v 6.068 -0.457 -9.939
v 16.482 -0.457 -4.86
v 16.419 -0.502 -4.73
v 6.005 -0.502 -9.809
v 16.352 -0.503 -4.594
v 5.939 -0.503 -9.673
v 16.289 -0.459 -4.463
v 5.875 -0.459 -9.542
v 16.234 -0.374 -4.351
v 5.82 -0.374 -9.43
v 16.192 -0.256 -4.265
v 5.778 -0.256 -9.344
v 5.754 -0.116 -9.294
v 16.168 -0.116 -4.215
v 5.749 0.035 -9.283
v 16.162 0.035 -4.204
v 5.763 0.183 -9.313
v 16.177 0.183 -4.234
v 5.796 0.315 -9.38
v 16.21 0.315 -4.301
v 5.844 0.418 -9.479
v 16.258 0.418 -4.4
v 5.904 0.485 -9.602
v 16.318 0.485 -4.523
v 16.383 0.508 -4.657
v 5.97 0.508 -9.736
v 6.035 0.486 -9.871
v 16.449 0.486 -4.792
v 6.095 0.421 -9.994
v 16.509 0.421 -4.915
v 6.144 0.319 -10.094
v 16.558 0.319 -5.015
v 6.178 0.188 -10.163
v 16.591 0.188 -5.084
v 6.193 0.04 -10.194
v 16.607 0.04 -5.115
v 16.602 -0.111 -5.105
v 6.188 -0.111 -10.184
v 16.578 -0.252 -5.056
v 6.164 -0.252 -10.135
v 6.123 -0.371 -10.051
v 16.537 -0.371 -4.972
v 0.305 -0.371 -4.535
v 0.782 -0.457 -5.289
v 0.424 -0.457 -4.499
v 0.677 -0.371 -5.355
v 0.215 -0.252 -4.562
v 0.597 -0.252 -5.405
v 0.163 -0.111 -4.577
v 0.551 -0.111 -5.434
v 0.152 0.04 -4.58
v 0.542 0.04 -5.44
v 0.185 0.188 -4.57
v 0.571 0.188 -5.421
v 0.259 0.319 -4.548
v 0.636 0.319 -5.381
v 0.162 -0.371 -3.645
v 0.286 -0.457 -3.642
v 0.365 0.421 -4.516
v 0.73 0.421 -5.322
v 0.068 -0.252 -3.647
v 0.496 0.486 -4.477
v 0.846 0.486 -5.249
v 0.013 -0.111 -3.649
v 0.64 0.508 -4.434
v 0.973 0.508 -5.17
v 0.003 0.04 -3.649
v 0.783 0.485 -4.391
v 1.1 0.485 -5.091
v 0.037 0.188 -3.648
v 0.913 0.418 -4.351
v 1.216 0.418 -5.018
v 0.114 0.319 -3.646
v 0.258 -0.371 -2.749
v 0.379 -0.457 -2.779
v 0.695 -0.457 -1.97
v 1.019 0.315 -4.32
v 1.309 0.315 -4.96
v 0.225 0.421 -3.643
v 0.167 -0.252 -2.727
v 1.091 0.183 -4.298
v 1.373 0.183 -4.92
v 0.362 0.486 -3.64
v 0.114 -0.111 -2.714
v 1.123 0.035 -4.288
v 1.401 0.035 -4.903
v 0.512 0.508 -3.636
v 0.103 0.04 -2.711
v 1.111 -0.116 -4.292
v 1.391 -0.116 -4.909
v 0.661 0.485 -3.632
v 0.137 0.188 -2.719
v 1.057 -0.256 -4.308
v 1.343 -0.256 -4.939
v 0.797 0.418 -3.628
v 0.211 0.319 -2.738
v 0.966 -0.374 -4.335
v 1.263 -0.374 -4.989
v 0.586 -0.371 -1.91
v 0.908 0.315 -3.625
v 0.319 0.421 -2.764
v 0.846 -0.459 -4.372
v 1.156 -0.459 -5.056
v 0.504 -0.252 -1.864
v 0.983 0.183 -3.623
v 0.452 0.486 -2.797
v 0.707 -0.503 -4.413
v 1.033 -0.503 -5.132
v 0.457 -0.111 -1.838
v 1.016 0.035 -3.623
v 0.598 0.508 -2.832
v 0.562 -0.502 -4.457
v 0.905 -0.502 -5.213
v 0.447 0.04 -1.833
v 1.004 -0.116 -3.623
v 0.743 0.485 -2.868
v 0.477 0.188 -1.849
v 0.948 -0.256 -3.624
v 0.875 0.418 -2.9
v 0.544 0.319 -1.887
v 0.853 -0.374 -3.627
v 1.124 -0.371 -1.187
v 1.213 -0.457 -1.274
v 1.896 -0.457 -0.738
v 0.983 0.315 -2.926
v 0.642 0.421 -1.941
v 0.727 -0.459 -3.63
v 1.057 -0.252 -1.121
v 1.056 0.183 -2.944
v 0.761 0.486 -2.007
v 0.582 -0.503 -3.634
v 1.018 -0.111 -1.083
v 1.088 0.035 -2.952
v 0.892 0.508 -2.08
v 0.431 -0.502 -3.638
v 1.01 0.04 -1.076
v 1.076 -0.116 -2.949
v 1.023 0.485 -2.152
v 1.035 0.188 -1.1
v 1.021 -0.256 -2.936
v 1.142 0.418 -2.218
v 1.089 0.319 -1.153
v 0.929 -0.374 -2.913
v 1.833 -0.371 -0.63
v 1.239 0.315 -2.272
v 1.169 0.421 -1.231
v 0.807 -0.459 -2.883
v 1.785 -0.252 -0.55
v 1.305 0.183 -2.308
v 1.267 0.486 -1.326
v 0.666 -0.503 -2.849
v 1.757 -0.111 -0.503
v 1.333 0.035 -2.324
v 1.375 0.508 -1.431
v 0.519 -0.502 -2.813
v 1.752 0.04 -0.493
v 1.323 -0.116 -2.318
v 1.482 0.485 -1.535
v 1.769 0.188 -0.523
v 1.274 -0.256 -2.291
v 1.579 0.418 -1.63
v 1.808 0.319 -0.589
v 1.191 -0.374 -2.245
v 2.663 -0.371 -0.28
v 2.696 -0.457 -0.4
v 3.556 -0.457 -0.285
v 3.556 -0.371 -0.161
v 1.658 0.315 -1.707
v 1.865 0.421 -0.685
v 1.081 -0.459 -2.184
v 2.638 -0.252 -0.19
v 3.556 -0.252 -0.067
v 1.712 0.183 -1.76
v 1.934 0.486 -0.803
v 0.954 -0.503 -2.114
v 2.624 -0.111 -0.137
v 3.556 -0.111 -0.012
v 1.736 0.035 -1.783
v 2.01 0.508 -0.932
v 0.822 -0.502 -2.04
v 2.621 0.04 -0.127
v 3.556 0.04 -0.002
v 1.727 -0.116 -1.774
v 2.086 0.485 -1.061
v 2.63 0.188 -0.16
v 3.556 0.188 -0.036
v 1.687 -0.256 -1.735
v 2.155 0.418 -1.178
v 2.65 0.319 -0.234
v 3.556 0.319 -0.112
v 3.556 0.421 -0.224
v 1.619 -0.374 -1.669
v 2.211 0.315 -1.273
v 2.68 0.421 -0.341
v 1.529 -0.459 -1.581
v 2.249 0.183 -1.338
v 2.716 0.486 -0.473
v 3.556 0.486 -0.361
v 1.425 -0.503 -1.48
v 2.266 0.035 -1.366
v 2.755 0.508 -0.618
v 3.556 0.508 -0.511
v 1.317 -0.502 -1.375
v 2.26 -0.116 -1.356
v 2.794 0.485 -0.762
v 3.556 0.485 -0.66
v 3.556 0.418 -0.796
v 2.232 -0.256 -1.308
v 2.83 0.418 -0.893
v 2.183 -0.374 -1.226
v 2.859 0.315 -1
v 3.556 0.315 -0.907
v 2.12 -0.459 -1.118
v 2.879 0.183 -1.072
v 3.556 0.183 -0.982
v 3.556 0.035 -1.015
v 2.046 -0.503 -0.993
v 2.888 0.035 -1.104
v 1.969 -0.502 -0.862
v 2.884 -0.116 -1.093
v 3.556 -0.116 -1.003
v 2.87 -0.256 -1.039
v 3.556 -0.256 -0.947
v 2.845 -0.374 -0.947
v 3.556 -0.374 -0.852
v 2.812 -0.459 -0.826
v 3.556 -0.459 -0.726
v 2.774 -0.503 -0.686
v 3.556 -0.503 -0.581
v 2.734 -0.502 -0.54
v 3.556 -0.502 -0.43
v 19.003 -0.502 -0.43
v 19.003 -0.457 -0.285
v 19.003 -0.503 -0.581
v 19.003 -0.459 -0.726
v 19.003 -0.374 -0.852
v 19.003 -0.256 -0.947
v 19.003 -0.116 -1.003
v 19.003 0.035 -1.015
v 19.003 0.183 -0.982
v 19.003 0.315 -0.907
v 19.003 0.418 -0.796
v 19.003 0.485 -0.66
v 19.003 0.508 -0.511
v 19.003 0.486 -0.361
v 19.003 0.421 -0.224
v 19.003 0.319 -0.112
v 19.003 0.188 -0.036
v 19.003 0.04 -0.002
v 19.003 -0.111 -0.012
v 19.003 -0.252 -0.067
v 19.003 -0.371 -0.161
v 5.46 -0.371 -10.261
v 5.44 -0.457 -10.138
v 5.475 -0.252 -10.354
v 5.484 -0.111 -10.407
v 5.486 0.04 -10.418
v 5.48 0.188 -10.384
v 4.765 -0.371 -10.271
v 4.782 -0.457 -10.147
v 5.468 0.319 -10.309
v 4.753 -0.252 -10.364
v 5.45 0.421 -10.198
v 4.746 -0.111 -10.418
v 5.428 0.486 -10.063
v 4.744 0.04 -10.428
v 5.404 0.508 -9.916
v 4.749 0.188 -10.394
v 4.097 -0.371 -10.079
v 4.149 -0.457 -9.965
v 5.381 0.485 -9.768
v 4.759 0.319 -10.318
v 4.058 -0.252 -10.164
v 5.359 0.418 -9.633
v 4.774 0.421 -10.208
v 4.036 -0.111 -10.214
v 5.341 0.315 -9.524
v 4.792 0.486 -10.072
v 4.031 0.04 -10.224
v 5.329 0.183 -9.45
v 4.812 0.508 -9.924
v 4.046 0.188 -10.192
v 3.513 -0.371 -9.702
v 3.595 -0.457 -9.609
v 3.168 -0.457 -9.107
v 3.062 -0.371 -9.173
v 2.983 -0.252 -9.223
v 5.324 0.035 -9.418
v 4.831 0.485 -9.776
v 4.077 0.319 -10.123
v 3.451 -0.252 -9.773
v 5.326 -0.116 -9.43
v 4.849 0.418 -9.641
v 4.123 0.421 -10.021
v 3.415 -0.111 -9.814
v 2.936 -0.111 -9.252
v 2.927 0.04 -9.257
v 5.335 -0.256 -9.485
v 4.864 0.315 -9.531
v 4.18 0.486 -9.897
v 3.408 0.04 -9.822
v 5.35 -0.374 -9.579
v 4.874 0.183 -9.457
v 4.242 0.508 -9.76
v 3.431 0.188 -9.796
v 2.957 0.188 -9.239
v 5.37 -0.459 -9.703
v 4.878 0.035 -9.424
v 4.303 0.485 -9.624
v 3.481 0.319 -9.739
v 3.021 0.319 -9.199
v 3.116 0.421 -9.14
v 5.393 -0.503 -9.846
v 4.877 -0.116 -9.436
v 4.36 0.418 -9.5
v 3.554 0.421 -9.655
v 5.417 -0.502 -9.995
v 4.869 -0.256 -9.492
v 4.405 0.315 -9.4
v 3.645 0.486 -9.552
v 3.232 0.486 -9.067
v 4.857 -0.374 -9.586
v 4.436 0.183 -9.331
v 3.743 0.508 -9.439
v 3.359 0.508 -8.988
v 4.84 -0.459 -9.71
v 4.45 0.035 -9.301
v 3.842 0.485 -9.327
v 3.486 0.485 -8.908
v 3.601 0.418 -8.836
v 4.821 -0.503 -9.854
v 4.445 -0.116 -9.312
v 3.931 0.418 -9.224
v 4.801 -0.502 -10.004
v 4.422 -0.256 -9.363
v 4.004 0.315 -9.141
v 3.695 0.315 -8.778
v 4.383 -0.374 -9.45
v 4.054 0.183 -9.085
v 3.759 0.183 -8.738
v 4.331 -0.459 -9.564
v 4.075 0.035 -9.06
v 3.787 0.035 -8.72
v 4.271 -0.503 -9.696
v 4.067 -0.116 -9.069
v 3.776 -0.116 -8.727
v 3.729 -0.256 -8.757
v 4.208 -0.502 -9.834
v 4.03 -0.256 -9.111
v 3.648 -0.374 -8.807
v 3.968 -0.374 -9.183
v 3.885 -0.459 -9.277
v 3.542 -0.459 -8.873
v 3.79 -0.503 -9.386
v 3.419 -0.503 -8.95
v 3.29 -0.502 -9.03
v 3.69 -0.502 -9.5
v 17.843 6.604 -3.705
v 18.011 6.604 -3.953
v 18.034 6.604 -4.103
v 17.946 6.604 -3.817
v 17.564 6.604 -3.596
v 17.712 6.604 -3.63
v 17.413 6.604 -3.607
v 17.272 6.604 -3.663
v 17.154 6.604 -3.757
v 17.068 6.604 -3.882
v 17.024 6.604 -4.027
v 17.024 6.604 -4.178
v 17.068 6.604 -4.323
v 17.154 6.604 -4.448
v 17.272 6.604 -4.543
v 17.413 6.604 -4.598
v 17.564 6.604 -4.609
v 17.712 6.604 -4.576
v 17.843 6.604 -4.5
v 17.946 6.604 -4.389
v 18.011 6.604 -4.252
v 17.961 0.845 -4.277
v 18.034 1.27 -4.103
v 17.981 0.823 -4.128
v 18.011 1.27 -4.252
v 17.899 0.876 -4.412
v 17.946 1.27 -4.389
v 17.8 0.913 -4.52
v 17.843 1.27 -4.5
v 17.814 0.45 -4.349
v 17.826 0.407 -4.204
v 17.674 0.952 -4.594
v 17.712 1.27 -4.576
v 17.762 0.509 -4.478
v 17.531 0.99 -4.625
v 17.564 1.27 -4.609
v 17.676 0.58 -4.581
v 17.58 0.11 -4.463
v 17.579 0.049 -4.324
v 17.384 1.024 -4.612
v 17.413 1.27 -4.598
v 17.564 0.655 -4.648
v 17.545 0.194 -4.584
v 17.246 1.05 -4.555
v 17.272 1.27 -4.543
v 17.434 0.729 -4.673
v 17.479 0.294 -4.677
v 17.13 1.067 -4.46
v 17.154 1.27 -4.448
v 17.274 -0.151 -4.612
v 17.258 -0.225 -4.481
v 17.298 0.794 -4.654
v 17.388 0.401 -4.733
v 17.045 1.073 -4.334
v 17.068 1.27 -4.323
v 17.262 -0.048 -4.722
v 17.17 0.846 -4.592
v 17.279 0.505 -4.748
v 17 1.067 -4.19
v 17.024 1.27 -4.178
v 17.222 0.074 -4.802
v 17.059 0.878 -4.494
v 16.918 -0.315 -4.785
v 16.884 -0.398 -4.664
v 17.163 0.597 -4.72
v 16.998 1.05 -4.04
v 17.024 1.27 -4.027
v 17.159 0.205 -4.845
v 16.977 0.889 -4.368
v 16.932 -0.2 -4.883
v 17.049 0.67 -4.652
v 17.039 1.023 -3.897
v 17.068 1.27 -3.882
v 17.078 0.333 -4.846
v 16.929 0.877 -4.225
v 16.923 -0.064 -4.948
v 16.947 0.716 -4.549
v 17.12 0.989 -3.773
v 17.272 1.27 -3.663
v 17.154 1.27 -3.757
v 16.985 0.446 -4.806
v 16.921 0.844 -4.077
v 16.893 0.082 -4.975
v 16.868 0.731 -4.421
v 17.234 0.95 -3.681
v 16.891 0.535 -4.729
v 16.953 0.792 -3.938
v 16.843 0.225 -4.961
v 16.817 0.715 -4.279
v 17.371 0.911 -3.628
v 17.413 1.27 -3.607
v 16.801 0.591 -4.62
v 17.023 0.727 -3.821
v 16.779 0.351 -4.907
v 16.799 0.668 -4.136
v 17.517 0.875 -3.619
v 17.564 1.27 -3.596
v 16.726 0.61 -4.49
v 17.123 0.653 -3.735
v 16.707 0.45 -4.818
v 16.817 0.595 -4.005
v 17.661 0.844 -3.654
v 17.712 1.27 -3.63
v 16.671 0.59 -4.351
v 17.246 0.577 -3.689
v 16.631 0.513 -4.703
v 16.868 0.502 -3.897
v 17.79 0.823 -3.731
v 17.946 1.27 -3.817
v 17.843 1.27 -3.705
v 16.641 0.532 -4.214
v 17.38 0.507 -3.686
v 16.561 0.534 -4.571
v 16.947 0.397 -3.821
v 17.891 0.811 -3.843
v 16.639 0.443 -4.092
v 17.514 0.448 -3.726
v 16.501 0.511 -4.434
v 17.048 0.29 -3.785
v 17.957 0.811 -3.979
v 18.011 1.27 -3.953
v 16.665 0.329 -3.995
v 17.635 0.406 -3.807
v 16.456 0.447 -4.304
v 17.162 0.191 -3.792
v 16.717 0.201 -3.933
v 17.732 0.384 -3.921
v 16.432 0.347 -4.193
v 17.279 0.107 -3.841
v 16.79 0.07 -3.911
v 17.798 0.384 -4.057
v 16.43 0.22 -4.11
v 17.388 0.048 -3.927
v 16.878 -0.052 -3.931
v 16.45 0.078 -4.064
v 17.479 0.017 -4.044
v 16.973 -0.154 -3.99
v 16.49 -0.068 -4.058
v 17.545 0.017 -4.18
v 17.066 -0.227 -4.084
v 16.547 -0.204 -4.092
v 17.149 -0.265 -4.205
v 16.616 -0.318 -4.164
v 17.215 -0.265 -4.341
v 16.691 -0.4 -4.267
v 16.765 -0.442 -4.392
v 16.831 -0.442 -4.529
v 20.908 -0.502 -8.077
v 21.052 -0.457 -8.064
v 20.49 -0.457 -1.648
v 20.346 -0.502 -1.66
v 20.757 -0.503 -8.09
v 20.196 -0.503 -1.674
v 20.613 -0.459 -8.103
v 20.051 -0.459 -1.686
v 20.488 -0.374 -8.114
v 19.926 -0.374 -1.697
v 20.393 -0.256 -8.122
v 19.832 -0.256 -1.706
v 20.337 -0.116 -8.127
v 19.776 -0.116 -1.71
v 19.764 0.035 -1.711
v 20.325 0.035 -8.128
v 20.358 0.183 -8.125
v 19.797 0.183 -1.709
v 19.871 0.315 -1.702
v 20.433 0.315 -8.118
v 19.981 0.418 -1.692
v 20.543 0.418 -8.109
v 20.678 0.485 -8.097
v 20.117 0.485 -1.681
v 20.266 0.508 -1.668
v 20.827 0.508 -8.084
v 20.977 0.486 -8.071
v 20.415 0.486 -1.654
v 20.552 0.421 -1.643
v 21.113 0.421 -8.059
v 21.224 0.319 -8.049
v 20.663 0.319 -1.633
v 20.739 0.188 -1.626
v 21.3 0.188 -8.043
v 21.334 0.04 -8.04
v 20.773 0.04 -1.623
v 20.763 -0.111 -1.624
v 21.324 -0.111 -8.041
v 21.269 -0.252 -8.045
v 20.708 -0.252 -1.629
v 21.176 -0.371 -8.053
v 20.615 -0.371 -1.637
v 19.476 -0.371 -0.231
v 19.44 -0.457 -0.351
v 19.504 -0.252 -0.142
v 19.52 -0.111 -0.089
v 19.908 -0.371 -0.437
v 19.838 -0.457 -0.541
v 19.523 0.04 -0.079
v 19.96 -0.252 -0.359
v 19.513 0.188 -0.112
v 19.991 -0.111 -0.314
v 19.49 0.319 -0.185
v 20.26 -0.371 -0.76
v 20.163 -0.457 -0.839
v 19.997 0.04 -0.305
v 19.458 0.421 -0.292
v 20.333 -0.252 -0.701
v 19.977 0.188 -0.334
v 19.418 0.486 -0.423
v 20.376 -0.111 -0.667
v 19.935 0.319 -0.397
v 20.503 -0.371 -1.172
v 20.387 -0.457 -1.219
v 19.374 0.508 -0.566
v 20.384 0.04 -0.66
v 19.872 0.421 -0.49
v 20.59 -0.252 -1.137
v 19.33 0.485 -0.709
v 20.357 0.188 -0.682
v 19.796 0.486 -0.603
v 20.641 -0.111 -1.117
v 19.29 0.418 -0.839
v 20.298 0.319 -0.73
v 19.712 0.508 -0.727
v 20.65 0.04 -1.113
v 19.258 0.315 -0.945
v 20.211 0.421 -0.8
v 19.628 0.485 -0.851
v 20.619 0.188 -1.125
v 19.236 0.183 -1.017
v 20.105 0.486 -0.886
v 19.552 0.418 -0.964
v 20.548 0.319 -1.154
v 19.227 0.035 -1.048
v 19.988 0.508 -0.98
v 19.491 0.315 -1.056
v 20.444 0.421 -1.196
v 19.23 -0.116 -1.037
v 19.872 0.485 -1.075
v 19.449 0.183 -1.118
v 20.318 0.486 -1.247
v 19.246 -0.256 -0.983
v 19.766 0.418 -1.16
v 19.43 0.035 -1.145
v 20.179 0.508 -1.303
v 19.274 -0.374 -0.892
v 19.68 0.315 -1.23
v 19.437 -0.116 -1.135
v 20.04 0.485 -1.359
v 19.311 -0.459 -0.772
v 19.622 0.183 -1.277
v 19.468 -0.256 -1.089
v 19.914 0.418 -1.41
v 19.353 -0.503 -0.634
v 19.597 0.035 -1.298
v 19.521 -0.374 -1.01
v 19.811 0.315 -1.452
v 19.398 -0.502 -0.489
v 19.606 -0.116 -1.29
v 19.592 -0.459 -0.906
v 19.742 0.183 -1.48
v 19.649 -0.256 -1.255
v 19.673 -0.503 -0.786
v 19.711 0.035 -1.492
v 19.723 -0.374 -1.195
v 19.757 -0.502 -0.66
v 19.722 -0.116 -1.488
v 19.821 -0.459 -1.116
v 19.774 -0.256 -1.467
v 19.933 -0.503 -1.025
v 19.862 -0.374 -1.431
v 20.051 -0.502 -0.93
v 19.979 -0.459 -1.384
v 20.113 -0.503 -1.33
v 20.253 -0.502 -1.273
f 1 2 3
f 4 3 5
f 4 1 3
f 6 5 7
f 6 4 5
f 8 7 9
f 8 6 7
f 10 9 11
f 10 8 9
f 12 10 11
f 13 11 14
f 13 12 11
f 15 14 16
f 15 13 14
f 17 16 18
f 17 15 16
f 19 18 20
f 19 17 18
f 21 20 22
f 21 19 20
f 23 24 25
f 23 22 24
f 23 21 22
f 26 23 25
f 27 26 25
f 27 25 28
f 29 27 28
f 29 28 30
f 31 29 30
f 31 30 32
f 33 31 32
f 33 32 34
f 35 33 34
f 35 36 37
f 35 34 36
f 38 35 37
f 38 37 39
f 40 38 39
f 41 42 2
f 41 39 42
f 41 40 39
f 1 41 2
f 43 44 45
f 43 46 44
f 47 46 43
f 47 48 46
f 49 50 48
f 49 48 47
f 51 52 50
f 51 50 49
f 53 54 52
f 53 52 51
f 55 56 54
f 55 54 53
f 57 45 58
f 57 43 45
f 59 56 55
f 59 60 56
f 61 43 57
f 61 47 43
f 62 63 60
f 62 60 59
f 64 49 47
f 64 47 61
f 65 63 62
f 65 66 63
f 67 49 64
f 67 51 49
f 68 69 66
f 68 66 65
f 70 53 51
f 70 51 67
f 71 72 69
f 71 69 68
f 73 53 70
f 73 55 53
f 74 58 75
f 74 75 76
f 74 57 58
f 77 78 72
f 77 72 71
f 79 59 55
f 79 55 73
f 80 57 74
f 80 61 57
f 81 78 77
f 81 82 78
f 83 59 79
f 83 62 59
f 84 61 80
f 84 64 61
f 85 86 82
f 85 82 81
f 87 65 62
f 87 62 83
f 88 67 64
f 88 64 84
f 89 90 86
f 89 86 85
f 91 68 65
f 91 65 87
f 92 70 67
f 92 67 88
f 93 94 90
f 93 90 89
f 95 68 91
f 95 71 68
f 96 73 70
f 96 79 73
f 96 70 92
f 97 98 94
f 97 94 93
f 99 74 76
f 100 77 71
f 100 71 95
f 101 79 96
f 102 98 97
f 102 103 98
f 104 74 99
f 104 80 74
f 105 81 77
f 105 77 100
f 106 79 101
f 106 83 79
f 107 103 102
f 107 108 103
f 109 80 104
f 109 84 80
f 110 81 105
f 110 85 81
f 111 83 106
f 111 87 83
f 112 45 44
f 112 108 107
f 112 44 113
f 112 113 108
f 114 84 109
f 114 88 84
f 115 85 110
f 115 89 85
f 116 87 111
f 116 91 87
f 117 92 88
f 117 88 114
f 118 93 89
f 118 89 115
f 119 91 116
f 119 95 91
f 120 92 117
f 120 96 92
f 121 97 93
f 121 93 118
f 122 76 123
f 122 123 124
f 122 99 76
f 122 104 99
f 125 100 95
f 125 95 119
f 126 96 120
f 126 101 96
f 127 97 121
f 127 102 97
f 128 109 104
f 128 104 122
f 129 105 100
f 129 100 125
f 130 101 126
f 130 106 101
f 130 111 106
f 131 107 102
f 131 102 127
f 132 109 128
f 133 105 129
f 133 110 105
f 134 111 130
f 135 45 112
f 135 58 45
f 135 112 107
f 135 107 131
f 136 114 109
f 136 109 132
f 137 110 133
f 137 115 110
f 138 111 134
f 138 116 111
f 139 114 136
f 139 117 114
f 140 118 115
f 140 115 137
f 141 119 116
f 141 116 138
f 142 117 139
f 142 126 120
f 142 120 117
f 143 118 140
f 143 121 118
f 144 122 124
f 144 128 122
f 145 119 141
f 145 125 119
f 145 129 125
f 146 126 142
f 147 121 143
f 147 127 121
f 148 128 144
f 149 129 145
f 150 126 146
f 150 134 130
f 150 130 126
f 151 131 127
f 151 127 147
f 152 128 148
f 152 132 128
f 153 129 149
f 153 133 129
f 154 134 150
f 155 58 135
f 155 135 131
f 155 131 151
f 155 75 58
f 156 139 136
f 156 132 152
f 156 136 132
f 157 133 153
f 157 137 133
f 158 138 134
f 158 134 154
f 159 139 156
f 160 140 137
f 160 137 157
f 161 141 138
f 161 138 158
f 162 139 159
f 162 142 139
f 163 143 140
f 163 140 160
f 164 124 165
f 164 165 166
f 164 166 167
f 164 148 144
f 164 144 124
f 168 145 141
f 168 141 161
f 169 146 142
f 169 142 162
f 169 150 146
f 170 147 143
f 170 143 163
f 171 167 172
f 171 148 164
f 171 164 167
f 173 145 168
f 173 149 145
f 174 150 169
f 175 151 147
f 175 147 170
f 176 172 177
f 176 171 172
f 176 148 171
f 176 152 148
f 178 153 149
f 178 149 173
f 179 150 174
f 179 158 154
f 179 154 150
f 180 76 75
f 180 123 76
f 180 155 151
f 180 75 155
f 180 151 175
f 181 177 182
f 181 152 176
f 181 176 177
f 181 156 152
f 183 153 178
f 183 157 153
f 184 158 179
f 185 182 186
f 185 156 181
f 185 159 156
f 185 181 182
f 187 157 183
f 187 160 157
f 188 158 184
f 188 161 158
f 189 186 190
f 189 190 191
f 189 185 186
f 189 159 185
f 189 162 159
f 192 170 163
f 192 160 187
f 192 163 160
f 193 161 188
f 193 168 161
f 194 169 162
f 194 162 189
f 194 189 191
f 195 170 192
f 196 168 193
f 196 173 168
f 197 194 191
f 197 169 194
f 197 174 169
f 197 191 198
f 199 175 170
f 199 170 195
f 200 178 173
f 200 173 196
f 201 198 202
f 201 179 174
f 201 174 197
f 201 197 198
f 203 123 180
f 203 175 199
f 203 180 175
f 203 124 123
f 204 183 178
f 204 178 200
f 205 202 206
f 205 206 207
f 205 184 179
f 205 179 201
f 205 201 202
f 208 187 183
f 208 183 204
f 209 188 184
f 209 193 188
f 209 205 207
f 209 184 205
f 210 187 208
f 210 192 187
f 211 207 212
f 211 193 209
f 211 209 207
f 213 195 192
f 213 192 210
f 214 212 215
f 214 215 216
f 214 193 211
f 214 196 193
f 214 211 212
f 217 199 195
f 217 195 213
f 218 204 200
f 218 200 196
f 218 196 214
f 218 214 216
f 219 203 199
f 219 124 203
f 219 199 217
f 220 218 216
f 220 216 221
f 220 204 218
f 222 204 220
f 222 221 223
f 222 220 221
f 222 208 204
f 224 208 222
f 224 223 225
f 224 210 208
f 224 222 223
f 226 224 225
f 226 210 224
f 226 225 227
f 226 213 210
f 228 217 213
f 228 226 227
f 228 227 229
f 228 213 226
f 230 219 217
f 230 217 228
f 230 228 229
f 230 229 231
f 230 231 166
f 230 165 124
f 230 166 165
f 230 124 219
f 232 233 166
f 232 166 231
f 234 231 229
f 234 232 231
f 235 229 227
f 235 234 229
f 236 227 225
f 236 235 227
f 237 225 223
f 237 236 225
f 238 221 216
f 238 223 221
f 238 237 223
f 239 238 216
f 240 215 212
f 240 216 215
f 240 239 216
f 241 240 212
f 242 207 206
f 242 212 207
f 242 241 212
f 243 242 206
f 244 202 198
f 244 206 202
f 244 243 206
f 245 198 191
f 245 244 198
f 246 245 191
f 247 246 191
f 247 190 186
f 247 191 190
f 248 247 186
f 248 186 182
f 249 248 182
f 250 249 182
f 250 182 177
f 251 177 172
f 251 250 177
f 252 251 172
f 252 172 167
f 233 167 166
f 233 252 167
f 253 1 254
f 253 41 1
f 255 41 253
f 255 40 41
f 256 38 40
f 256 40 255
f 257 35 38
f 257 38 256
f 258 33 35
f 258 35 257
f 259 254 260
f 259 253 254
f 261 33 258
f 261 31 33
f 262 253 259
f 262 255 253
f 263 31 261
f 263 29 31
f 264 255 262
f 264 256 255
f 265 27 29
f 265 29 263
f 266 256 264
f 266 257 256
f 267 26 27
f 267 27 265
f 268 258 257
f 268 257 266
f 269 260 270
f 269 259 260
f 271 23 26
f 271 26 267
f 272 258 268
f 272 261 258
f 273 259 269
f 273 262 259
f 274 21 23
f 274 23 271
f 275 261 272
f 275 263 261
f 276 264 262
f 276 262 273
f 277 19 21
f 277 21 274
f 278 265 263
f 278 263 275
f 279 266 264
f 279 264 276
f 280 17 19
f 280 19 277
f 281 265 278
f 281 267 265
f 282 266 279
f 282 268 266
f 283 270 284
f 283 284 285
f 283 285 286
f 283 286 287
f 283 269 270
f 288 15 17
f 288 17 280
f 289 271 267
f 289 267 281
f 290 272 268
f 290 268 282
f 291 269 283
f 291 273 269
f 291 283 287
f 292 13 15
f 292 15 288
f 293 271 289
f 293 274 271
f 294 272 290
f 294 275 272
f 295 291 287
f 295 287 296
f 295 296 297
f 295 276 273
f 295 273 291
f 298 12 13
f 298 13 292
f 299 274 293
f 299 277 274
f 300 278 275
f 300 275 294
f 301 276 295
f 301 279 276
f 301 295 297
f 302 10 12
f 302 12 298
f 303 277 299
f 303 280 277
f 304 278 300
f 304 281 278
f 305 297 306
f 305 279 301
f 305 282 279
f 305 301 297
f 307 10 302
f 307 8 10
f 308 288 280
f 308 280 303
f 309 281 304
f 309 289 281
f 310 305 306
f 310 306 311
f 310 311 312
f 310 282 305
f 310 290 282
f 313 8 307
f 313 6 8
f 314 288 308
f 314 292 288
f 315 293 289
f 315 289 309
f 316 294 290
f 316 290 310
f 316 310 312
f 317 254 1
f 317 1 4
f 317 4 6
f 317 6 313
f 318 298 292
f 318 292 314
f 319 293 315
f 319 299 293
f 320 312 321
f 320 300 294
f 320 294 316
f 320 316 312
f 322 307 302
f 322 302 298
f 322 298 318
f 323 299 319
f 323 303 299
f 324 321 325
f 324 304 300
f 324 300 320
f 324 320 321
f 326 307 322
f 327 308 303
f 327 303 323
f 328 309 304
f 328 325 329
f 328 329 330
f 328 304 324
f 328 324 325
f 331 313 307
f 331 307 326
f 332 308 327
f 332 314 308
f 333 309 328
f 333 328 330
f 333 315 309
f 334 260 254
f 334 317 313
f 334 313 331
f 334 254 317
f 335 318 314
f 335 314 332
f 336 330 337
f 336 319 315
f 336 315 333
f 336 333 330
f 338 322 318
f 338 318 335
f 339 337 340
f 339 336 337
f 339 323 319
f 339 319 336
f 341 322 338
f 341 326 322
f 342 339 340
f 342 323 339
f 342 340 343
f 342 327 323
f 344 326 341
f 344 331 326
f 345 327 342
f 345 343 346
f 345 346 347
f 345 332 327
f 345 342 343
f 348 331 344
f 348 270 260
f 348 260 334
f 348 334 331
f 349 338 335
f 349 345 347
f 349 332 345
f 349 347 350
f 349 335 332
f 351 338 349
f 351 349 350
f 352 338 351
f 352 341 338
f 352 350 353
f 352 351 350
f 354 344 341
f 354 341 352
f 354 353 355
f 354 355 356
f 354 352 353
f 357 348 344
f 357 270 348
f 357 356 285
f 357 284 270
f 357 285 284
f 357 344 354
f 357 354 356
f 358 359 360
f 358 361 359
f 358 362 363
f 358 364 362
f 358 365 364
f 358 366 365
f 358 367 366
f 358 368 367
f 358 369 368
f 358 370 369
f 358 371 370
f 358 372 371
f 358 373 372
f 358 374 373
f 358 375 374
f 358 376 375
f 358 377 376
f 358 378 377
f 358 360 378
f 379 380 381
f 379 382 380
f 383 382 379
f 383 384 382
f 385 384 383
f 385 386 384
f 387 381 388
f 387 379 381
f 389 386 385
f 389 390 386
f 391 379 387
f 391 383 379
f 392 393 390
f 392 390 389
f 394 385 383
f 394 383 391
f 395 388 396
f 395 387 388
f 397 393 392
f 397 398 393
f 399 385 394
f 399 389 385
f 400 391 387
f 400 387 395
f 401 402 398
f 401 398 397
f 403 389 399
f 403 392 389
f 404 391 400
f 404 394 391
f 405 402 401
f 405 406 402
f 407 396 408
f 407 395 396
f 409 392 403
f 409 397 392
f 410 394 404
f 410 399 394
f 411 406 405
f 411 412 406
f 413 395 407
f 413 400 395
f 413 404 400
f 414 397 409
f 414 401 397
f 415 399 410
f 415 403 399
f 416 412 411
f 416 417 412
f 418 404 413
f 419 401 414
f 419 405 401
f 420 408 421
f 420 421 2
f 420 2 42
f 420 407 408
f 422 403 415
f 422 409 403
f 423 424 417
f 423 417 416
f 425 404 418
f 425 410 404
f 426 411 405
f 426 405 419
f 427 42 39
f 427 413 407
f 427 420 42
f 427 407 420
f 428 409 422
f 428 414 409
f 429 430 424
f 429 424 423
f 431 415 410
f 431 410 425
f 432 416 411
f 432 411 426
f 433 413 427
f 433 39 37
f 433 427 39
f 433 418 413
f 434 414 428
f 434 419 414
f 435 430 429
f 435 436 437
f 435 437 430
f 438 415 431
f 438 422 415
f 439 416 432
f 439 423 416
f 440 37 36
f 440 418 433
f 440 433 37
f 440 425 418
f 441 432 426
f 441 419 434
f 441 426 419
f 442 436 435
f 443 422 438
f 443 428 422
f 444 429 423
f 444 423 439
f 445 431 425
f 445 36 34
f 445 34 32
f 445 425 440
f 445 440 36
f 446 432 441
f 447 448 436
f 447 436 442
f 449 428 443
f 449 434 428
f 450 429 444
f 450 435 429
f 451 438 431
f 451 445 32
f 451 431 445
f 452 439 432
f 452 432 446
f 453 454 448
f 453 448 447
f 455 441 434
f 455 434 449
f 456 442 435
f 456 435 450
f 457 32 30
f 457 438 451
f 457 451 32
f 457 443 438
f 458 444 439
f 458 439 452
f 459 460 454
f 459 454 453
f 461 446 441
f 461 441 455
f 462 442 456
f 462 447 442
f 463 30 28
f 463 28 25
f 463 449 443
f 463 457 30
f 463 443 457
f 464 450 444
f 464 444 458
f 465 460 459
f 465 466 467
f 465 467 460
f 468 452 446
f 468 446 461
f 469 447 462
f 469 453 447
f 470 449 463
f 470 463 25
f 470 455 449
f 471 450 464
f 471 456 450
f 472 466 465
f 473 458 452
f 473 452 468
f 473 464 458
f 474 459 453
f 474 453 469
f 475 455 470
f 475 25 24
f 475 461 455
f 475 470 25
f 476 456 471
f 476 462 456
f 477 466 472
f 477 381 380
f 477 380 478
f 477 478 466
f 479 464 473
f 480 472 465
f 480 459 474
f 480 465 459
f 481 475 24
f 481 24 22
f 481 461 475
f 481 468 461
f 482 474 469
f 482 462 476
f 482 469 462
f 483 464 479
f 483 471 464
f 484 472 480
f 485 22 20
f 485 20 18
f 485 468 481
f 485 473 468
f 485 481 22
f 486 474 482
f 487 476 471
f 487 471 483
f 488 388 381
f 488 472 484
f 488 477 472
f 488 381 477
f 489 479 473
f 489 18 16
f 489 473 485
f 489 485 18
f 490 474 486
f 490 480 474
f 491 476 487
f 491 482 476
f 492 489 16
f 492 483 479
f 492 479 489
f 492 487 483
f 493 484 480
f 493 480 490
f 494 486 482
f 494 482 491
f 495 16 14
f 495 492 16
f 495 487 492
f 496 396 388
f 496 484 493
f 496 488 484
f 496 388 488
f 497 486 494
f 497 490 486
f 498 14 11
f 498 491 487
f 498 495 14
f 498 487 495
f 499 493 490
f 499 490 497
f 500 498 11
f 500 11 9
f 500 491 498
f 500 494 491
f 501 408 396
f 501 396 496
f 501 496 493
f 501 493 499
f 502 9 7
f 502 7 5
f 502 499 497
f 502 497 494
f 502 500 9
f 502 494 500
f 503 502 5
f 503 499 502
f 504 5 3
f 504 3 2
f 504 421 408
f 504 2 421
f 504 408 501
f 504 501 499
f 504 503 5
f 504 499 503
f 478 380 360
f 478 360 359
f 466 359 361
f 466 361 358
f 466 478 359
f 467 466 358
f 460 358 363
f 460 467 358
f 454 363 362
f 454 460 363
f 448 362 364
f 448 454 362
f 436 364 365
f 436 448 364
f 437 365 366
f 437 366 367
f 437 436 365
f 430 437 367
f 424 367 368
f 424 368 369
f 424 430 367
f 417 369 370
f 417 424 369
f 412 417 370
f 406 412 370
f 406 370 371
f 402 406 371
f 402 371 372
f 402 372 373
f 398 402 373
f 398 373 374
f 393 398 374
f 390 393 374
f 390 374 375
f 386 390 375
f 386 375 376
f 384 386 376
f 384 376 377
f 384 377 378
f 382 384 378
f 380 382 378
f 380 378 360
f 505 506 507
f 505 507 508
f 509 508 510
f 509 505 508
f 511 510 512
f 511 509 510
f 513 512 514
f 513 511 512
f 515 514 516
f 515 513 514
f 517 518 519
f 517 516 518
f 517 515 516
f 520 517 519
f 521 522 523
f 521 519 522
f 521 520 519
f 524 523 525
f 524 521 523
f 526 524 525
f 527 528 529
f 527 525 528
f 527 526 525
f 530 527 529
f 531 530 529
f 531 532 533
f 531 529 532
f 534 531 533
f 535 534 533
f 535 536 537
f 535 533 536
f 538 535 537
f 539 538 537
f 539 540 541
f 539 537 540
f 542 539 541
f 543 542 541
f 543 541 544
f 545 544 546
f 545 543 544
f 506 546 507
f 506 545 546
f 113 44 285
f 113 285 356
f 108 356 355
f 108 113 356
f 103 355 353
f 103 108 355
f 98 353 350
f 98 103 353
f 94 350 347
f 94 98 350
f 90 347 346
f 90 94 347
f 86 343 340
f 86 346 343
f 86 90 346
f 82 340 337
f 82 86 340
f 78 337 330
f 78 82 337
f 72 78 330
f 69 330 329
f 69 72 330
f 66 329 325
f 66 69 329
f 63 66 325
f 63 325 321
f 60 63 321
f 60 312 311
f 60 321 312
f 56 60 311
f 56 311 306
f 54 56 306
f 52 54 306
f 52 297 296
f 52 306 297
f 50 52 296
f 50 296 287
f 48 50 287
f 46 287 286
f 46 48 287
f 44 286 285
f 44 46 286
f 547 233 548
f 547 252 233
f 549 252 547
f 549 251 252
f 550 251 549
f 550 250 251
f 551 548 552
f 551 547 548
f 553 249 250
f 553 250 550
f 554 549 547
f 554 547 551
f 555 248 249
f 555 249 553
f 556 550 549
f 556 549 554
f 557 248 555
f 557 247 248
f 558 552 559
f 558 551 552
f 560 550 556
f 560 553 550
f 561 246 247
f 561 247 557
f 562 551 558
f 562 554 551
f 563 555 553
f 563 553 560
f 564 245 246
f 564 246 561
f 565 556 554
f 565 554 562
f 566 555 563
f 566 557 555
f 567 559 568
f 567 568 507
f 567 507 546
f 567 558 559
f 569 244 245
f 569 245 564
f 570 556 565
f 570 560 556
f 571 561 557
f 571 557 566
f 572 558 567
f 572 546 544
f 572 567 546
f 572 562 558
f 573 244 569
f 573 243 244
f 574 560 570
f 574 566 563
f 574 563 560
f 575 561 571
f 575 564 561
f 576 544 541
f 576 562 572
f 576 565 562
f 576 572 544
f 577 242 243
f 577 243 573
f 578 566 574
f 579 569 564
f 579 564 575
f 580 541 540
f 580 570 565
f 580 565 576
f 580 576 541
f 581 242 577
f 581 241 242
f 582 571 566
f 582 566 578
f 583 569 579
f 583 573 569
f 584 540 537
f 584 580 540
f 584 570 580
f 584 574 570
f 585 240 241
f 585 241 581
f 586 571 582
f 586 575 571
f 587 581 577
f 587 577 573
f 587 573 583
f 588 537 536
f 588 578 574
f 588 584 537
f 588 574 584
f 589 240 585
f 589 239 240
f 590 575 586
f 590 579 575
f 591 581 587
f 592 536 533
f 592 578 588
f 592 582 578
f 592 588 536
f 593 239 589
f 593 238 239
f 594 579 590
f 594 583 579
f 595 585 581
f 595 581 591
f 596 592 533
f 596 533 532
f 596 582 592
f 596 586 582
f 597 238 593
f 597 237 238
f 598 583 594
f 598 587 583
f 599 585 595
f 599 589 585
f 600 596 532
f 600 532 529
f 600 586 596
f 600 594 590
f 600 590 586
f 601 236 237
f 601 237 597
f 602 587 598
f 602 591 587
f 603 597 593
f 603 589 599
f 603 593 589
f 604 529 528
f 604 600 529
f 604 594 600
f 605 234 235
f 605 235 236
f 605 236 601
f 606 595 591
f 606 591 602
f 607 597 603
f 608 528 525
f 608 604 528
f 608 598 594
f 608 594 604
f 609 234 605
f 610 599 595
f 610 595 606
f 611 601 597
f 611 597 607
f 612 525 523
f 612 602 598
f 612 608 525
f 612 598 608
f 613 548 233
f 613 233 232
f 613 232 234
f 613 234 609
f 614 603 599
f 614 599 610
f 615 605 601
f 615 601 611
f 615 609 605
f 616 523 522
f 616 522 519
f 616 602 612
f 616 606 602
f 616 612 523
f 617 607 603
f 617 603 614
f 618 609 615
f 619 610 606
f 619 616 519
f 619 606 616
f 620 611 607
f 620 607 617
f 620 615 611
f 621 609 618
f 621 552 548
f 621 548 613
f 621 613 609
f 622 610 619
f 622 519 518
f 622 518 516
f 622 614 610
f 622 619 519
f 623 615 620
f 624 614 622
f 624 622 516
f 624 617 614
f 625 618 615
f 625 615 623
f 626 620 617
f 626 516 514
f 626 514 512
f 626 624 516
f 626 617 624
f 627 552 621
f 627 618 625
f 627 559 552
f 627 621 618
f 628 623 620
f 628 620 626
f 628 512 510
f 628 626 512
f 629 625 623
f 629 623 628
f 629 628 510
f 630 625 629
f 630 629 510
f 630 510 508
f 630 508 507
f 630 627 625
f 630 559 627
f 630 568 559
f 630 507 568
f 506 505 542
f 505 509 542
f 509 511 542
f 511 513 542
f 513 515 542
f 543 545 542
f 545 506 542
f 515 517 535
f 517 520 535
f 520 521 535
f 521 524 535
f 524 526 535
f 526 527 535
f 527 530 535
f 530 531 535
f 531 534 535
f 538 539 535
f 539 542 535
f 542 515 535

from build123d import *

# Parameters (mm, degrees)
SKETCH4_R = 0.508


with BuildPart() as part:
    # Sweep1: sweep along a curve in space
    with BuildLine() as sweep1_path:
        Line((17.526, 6.604, -4.102670361), (17.526, 1.27, -4.102670361))
        ThreePointArc((17.526, 1.27, -4.102670361), (17.191671635, 0.371974388, -4.2657332), (16.384531561, 0, -4.659401718))
        Line((16.384531561, 0, -4.659401718), (5.97077017, 0, -9.738532518))
        ThreePointArc((5.97077017, 0, -9.738532518), (4.519904893, 0, -9.865466782), (3.356766269, 0, -8.988978961))
        Line((3.356766269, 0, -8.988978961), (0.971149403, 0, -5.171193917))
        ThreePointArc((0.971149403, 0, -5.171193917), (0.890159133, 0, -2.078300277), (3.556, 0, -0.508))
        Line((3.556, 0, -0.508), (19.003402457, 0, -0.508))
        ThreePointArc((19.003402457, 0, -0.508), (19.861402021, 0, -0.841657782), (20.268569724, 0, -1.667312207))
        Line((20.268569724, 0, -1.667312207), (20.829933093, 0, -8.083724883))
    # Sketch4 → Sweep1 (sweep)
    with BuildSketch(Plane(origin=(0, 6.604, 0), x_dir=(1, 0, 0), z_dir=(0, 1, 0))):
        with Locations((17.526, 4.102670361)):
            Circle(SKETCH4_R)
    sweep(path=sweep1_path.line)


solid = part.part
